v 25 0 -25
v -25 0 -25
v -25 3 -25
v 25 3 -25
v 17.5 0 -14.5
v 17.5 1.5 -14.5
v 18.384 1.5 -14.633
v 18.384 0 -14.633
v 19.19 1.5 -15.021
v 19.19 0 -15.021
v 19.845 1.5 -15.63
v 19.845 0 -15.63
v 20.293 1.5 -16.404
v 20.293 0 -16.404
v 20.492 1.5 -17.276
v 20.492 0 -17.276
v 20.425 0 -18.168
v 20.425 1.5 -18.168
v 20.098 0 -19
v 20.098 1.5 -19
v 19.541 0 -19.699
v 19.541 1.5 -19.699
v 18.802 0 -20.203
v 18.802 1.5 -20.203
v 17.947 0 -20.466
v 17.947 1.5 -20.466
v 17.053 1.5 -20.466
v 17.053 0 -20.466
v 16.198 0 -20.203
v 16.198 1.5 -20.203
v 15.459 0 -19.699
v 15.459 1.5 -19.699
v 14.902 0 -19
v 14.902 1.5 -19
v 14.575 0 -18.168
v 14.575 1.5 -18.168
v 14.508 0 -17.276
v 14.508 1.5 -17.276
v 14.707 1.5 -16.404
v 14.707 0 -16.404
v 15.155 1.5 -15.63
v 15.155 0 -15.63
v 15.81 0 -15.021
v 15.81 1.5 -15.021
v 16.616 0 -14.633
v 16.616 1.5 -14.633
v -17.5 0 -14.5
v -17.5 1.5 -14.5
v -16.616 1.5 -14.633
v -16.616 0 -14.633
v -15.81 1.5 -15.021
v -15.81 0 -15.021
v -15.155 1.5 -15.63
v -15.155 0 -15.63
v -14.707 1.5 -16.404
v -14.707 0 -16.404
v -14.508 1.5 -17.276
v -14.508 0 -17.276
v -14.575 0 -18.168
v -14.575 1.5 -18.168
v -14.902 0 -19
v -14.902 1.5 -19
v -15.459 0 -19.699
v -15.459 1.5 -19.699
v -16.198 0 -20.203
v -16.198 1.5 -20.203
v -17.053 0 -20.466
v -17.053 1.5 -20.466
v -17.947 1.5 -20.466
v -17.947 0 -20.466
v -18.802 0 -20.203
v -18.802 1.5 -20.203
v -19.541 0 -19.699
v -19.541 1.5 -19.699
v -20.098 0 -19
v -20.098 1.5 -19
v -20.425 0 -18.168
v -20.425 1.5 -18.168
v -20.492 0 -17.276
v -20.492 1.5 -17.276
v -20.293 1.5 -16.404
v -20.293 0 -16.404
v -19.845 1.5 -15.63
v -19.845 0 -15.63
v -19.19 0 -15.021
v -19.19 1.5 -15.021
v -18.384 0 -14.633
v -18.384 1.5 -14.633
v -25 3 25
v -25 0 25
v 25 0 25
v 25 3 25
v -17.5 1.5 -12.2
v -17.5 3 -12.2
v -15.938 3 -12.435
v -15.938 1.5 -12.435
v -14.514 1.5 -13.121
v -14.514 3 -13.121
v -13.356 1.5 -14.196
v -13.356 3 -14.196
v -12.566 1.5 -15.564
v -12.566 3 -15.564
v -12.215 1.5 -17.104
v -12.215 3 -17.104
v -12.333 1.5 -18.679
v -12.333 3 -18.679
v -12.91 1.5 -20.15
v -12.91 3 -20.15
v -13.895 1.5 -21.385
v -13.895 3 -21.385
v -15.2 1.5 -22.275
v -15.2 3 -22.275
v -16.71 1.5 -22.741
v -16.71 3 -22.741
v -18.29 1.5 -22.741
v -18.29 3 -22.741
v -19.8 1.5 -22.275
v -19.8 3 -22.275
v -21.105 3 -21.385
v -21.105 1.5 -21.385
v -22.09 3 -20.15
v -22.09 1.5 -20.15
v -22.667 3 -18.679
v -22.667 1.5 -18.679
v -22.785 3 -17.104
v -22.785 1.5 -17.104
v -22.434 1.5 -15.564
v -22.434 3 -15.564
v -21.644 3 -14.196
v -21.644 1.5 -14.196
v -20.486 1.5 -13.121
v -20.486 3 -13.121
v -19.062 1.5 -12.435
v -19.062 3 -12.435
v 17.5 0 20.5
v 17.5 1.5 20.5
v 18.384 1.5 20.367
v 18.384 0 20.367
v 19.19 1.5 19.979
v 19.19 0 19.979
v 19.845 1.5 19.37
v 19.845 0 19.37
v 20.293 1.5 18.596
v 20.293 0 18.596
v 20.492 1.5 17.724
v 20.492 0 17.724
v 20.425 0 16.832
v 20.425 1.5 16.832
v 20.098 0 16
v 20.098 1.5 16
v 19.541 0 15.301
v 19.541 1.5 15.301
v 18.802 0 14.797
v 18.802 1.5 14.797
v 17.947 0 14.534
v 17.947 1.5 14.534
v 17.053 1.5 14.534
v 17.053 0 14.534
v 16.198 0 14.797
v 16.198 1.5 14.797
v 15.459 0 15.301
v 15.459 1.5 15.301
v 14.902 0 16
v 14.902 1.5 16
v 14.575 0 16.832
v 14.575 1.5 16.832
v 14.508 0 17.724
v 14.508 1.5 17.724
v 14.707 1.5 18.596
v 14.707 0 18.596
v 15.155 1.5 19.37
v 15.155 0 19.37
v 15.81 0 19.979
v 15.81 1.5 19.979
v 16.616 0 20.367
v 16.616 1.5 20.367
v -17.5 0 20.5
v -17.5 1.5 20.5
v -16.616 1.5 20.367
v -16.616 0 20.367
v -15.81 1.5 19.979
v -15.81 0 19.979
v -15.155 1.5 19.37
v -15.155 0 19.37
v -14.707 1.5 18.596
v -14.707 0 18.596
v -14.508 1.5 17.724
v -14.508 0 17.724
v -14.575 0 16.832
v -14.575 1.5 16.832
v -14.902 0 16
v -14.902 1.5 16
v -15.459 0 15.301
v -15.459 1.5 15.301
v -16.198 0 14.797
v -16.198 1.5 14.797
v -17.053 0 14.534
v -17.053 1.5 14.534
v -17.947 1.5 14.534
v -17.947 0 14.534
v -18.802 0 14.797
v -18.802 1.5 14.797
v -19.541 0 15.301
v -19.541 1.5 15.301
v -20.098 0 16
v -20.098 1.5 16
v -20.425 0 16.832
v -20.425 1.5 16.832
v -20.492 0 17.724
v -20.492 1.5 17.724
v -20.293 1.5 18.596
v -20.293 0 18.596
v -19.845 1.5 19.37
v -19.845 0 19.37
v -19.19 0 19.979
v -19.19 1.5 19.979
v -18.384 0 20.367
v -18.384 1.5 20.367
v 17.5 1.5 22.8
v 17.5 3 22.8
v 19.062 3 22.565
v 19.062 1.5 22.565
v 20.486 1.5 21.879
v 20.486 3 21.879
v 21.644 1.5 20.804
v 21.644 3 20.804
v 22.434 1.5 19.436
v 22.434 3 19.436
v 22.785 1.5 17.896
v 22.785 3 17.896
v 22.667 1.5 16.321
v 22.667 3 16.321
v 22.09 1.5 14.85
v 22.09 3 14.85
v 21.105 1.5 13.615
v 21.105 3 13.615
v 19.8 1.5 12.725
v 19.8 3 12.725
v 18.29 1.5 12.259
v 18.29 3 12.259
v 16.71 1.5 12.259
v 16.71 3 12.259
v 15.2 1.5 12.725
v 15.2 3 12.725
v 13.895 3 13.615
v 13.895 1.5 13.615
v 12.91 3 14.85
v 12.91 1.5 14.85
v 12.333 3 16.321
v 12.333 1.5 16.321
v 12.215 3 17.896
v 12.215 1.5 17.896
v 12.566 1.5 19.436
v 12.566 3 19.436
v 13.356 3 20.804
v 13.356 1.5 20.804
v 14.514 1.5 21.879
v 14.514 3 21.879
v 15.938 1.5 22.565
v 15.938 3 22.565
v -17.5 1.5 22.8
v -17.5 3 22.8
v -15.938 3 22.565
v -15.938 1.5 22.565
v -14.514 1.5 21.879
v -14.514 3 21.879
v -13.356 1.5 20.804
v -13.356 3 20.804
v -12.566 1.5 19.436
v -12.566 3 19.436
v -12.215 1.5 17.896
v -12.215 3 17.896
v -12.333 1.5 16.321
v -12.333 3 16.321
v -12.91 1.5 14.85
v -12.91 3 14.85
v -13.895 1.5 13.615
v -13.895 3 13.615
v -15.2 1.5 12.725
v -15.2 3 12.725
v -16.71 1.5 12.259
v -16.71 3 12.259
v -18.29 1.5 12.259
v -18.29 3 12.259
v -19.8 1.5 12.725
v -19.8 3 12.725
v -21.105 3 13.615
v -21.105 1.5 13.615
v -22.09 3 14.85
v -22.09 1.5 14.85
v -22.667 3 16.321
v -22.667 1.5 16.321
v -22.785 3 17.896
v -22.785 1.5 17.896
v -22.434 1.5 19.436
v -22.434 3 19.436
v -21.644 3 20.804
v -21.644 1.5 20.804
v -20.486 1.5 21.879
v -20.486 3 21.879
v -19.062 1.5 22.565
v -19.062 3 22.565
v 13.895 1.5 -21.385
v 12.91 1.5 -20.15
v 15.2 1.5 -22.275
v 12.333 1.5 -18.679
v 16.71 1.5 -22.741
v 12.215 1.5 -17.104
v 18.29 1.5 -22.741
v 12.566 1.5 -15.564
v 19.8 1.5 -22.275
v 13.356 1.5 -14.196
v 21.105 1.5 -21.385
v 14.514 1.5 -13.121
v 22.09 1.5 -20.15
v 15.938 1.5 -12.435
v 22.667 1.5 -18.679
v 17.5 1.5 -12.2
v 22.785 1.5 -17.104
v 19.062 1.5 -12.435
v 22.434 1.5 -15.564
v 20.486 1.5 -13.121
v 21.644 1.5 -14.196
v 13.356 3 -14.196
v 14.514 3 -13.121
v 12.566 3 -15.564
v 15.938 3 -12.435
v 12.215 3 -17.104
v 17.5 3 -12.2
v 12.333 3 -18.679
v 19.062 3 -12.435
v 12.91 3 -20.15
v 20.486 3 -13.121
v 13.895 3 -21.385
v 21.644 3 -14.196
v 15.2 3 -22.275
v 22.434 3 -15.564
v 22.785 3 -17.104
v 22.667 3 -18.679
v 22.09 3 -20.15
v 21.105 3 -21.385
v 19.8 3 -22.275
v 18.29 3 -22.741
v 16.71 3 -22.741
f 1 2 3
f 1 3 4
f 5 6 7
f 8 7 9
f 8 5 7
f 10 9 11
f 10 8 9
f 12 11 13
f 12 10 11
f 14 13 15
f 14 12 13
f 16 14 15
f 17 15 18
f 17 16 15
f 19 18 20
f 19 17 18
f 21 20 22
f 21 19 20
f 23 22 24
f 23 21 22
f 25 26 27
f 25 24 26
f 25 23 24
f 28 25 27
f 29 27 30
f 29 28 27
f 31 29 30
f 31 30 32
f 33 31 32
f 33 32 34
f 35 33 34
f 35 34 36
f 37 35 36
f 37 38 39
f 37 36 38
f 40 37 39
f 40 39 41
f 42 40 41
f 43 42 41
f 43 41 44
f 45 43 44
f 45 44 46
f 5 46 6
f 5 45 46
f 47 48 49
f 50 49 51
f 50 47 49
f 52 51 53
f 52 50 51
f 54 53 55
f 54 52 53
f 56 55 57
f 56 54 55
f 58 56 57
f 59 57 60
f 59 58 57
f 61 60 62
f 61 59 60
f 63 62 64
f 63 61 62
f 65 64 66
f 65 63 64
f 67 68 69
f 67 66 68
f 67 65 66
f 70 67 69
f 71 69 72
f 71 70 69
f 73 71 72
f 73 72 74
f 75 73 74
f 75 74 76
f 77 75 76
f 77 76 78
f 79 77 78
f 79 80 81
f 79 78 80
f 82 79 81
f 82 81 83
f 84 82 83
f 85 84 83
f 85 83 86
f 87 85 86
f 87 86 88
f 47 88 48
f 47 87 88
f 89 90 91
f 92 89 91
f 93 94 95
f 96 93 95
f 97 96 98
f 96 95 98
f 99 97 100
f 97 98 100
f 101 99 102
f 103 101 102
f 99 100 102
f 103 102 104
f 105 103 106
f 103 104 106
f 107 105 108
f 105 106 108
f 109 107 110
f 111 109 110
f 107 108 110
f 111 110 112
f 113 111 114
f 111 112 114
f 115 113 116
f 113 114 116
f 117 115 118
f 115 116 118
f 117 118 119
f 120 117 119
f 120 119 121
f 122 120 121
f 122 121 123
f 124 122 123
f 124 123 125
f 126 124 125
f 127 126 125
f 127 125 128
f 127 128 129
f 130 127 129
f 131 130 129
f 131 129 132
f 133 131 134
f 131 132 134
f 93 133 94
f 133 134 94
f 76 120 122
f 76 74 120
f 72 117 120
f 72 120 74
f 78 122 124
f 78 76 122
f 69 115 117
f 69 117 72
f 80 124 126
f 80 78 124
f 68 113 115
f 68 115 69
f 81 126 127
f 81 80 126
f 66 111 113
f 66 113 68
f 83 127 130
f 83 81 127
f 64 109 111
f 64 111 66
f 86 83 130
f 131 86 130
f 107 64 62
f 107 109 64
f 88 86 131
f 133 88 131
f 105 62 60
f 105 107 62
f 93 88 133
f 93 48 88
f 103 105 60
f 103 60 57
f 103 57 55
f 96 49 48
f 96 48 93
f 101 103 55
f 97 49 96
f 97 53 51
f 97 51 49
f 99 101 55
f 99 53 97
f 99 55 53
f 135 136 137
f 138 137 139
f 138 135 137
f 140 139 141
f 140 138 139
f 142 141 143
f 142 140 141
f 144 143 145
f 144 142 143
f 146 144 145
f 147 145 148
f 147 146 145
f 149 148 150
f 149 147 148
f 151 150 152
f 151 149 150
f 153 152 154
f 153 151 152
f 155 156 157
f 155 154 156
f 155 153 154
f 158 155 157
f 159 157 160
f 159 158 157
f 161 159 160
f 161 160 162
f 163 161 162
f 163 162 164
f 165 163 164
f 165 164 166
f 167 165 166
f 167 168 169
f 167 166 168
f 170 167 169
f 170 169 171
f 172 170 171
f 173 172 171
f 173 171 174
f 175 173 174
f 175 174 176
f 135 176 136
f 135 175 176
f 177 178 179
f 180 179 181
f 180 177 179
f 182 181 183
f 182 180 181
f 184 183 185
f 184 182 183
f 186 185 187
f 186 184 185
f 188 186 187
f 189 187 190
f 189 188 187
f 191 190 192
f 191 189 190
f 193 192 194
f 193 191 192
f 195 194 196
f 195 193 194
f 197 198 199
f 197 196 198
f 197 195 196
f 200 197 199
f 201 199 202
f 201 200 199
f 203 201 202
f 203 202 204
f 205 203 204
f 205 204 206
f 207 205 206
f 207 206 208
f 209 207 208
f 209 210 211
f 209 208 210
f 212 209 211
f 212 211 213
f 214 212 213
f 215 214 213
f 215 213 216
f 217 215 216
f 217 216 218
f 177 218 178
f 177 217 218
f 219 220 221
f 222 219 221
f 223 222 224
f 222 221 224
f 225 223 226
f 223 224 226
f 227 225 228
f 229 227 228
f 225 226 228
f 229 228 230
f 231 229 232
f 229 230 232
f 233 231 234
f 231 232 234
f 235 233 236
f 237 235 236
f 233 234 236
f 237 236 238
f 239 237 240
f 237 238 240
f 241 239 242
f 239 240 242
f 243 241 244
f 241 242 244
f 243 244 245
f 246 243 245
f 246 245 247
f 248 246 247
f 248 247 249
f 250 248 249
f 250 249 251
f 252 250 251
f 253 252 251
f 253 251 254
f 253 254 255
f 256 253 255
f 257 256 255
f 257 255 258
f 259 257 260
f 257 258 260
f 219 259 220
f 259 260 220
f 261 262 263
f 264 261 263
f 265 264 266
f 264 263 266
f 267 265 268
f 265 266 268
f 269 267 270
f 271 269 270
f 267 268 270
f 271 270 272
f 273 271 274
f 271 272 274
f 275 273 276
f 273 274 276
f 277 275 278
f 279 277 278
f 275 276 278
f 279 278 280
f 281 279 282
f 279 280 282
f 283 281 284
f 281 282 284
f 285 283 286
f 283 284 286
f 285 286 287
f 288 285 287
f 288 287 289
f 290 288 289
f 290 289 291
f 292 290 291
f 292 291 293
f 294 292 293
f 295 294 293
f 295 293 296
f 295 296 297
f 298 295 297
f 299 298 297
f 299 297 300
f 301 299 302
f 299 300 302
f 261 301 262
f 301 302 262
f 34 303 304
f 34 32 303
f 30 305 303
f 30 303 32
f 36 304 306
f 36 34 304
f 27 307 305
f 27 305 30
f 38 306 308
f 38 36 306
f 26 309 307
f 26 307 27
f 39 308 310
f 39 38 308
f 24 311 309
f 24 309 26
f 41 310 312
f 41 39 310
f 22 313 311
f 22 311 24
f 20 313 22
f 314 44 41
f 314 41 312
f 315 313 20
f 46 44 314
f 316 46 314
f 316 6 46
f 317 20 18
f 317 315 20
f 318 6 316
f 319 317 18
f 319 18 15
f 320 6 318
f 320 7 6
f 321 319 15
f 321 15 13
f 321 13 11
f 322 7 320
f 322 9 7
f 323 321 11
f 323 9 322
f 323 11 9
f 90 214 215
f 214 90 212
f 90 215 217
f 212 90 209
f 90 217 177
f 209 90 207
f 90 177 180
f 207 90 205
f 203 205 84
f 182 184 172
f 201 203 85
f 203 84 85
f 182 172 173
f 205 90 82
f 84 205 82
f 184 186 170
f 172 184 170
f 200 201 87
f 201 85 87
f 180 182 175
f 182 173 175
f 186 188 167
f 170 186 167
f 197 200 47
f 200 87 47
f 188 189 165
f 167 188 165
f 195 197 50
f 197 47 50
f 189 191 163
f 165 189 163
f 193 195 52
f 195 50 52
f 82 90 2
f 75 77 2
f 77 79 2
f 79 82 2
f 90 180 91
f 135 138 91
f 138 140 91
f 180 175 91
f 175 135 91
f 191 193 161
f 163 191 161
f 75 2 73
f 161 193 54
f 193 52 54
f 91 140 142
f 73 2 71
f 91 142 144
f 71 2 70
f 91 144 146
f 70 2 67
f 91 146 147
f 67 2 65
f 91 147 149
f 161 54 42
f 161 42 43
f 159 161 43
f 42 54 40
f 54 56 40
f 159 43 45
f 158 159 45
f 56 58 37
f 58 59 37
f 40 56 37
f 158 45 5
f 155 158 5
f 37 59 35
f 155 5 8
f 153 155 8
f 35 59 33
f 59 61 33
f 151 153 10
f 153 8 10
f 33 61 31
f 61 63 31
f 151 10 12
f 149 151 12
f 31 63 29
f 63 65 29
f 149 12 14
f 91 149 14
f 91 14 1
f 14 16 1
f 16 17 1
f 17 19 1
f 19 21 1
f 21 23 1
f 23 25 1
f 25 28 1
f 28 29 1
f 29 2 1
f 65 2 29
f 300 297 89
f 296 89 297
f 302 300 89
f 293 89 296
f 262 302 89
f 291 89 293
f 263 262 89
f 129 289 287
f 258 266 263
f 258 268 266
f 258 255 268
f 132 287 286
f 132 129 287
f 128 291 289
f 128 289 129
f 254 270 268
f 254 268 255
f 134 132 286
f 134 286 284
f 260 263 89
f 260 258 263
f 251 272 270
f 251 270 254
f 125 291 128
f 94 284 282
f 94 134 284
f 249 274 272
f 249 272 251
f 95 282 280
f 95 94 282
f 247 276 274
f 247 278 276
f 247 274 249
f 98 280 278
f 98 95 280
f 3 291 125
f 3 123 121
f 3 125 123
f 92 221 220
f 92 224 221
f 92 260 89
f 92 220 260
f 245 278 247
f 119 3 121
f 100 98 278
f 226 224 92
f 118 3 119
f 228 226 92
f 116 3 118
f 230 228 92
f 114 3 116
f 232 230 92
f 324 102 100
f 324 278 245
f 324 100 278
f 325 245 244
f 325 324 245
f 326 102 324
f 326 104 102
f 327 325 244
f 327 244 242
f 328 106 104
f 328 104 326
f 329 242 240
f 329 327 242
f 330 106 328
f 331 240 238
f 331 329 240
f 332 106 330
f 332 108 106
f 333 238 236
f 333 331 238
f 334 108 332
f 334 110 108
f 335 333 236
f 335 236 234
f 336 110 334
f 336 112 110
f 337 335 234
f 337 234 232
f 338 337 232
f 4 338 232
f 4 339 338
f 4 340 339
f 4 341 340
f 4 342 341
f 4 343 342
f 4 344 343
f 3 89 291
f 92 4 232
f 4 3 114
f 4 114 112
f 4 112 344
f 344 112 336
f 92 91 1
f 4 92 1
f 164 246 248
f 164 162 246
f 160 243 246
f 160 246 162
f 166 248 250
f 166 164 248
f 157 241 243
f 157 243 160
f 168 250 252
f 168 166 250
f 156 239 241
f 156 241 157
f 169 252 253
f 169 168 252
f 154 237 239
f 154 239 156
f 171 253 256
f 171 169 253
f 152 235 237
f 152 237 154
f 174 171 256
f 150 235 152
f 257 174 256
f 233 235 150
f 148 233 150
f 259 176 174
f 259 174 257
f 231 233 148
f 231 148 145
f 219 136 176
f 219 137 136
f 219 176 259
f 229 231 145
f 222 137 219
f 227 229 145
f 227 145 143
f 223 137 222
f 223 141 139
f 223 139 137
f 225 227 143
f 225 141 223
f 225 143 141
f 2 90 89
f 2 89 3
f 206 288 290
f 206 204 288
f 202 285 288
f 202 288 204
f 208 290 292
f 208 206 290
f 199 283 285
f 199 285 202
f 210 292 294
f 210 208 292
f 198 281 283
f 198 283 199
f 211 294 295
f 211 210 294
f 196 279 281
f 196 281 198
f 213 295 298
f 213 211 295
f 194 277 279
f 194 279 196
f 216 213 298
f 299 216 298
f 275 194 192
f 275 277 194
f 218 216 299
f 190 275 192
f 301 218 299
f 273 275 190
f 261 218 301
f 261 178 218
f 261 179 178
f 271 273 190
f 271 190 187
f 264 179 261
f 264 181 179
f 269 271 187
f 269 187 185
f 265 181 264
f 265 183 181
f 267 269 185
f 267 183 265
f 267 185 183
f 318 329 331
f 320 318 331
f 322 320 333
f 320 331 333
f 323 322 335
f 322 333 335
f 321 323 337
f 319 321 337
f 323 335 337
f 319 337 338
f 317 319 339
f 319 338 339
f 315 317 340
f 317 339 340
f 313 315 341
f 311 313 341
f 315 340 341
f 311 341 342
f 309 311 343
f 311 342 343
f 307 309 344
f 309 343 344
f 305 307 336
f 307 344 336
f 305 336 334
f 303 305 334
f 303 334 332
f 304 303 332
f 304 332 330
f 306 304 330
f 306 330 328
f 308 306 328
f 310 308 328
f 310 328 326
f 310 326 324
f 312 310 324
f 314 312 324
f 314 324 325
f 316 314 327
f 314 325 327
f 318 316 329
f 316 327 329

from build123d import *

# Parameters (mm, degrees)
SKETCH1_W           = 50
SKETCH1_H           = 50
SKETCH1_R           = 3
BOSS_EXTRUDE1_DEPTH = 3
SKETCH2_R           = 5.3
CUT_EXTRUDE1_DEPTH  = 1.5


with BuildPart() as part:
    # Sketch1 → Boss-Extrude1 (new body)
    with BuildSketch(Plane(origin=(0, 0, 0), x_dir=(1, 0, 0), z_dir=(0, 1, 0))):
        Rectangle(SKETCH1_W, SKETCH1_H)
        with Locations(Location((-17.5, 17.5, 0), (0, 0, 270))):
            Circle(SKETCH1_R, mode=Mode.SUBTRACT)
        with Locations(Location((17.5, 17.5, 0), (0, 0, 270))):
            Circle(SKETCH1_R, mode=Mode.SUBTRACT)
        with Locations(Location((-17.5, -17.5, 0), (0, 0, 270))):
            Circle(SKETCH1_R, mode=Mode.SUBTRACT)
        with Locations(Location((17.5, -17.5, 0), (0, 0, 270))):
            Circle(SKETCH1_R, mode=Mode.SUBTRACT)
    extrude(amount=BOSS_EXTRUDE1_DEPTH)

    # Sketch2 → Cut-Extrude1 (cut)
    with BuildSketch(Plane(origin=(0, 3, 0), x_dir=(1, 0, 0), z_dir=(0, 1, 0))):
        with Locations(Location((-17.5, 17.5, 0), (0, 0, 270))):
            Circle(SKETCH2_R)
        with Locations(Location((17.5, 17.5, 0), (0, 0, 270))):
            Circle(SKETCH2_R)
        with Locations(Location((17.5, -17.5, 0), (0, 0, 270))):
            Circle(SKETCH2_R)
        with Locations(Location((-17.5, -17.5, 0), (0, 0, 270))):
            Circle(SKETCH2_R)
    extrude(amount=-CUT_EXTRUDE1_DEPTH, mode=Mode.SUBTRACT)


solid = part.part
